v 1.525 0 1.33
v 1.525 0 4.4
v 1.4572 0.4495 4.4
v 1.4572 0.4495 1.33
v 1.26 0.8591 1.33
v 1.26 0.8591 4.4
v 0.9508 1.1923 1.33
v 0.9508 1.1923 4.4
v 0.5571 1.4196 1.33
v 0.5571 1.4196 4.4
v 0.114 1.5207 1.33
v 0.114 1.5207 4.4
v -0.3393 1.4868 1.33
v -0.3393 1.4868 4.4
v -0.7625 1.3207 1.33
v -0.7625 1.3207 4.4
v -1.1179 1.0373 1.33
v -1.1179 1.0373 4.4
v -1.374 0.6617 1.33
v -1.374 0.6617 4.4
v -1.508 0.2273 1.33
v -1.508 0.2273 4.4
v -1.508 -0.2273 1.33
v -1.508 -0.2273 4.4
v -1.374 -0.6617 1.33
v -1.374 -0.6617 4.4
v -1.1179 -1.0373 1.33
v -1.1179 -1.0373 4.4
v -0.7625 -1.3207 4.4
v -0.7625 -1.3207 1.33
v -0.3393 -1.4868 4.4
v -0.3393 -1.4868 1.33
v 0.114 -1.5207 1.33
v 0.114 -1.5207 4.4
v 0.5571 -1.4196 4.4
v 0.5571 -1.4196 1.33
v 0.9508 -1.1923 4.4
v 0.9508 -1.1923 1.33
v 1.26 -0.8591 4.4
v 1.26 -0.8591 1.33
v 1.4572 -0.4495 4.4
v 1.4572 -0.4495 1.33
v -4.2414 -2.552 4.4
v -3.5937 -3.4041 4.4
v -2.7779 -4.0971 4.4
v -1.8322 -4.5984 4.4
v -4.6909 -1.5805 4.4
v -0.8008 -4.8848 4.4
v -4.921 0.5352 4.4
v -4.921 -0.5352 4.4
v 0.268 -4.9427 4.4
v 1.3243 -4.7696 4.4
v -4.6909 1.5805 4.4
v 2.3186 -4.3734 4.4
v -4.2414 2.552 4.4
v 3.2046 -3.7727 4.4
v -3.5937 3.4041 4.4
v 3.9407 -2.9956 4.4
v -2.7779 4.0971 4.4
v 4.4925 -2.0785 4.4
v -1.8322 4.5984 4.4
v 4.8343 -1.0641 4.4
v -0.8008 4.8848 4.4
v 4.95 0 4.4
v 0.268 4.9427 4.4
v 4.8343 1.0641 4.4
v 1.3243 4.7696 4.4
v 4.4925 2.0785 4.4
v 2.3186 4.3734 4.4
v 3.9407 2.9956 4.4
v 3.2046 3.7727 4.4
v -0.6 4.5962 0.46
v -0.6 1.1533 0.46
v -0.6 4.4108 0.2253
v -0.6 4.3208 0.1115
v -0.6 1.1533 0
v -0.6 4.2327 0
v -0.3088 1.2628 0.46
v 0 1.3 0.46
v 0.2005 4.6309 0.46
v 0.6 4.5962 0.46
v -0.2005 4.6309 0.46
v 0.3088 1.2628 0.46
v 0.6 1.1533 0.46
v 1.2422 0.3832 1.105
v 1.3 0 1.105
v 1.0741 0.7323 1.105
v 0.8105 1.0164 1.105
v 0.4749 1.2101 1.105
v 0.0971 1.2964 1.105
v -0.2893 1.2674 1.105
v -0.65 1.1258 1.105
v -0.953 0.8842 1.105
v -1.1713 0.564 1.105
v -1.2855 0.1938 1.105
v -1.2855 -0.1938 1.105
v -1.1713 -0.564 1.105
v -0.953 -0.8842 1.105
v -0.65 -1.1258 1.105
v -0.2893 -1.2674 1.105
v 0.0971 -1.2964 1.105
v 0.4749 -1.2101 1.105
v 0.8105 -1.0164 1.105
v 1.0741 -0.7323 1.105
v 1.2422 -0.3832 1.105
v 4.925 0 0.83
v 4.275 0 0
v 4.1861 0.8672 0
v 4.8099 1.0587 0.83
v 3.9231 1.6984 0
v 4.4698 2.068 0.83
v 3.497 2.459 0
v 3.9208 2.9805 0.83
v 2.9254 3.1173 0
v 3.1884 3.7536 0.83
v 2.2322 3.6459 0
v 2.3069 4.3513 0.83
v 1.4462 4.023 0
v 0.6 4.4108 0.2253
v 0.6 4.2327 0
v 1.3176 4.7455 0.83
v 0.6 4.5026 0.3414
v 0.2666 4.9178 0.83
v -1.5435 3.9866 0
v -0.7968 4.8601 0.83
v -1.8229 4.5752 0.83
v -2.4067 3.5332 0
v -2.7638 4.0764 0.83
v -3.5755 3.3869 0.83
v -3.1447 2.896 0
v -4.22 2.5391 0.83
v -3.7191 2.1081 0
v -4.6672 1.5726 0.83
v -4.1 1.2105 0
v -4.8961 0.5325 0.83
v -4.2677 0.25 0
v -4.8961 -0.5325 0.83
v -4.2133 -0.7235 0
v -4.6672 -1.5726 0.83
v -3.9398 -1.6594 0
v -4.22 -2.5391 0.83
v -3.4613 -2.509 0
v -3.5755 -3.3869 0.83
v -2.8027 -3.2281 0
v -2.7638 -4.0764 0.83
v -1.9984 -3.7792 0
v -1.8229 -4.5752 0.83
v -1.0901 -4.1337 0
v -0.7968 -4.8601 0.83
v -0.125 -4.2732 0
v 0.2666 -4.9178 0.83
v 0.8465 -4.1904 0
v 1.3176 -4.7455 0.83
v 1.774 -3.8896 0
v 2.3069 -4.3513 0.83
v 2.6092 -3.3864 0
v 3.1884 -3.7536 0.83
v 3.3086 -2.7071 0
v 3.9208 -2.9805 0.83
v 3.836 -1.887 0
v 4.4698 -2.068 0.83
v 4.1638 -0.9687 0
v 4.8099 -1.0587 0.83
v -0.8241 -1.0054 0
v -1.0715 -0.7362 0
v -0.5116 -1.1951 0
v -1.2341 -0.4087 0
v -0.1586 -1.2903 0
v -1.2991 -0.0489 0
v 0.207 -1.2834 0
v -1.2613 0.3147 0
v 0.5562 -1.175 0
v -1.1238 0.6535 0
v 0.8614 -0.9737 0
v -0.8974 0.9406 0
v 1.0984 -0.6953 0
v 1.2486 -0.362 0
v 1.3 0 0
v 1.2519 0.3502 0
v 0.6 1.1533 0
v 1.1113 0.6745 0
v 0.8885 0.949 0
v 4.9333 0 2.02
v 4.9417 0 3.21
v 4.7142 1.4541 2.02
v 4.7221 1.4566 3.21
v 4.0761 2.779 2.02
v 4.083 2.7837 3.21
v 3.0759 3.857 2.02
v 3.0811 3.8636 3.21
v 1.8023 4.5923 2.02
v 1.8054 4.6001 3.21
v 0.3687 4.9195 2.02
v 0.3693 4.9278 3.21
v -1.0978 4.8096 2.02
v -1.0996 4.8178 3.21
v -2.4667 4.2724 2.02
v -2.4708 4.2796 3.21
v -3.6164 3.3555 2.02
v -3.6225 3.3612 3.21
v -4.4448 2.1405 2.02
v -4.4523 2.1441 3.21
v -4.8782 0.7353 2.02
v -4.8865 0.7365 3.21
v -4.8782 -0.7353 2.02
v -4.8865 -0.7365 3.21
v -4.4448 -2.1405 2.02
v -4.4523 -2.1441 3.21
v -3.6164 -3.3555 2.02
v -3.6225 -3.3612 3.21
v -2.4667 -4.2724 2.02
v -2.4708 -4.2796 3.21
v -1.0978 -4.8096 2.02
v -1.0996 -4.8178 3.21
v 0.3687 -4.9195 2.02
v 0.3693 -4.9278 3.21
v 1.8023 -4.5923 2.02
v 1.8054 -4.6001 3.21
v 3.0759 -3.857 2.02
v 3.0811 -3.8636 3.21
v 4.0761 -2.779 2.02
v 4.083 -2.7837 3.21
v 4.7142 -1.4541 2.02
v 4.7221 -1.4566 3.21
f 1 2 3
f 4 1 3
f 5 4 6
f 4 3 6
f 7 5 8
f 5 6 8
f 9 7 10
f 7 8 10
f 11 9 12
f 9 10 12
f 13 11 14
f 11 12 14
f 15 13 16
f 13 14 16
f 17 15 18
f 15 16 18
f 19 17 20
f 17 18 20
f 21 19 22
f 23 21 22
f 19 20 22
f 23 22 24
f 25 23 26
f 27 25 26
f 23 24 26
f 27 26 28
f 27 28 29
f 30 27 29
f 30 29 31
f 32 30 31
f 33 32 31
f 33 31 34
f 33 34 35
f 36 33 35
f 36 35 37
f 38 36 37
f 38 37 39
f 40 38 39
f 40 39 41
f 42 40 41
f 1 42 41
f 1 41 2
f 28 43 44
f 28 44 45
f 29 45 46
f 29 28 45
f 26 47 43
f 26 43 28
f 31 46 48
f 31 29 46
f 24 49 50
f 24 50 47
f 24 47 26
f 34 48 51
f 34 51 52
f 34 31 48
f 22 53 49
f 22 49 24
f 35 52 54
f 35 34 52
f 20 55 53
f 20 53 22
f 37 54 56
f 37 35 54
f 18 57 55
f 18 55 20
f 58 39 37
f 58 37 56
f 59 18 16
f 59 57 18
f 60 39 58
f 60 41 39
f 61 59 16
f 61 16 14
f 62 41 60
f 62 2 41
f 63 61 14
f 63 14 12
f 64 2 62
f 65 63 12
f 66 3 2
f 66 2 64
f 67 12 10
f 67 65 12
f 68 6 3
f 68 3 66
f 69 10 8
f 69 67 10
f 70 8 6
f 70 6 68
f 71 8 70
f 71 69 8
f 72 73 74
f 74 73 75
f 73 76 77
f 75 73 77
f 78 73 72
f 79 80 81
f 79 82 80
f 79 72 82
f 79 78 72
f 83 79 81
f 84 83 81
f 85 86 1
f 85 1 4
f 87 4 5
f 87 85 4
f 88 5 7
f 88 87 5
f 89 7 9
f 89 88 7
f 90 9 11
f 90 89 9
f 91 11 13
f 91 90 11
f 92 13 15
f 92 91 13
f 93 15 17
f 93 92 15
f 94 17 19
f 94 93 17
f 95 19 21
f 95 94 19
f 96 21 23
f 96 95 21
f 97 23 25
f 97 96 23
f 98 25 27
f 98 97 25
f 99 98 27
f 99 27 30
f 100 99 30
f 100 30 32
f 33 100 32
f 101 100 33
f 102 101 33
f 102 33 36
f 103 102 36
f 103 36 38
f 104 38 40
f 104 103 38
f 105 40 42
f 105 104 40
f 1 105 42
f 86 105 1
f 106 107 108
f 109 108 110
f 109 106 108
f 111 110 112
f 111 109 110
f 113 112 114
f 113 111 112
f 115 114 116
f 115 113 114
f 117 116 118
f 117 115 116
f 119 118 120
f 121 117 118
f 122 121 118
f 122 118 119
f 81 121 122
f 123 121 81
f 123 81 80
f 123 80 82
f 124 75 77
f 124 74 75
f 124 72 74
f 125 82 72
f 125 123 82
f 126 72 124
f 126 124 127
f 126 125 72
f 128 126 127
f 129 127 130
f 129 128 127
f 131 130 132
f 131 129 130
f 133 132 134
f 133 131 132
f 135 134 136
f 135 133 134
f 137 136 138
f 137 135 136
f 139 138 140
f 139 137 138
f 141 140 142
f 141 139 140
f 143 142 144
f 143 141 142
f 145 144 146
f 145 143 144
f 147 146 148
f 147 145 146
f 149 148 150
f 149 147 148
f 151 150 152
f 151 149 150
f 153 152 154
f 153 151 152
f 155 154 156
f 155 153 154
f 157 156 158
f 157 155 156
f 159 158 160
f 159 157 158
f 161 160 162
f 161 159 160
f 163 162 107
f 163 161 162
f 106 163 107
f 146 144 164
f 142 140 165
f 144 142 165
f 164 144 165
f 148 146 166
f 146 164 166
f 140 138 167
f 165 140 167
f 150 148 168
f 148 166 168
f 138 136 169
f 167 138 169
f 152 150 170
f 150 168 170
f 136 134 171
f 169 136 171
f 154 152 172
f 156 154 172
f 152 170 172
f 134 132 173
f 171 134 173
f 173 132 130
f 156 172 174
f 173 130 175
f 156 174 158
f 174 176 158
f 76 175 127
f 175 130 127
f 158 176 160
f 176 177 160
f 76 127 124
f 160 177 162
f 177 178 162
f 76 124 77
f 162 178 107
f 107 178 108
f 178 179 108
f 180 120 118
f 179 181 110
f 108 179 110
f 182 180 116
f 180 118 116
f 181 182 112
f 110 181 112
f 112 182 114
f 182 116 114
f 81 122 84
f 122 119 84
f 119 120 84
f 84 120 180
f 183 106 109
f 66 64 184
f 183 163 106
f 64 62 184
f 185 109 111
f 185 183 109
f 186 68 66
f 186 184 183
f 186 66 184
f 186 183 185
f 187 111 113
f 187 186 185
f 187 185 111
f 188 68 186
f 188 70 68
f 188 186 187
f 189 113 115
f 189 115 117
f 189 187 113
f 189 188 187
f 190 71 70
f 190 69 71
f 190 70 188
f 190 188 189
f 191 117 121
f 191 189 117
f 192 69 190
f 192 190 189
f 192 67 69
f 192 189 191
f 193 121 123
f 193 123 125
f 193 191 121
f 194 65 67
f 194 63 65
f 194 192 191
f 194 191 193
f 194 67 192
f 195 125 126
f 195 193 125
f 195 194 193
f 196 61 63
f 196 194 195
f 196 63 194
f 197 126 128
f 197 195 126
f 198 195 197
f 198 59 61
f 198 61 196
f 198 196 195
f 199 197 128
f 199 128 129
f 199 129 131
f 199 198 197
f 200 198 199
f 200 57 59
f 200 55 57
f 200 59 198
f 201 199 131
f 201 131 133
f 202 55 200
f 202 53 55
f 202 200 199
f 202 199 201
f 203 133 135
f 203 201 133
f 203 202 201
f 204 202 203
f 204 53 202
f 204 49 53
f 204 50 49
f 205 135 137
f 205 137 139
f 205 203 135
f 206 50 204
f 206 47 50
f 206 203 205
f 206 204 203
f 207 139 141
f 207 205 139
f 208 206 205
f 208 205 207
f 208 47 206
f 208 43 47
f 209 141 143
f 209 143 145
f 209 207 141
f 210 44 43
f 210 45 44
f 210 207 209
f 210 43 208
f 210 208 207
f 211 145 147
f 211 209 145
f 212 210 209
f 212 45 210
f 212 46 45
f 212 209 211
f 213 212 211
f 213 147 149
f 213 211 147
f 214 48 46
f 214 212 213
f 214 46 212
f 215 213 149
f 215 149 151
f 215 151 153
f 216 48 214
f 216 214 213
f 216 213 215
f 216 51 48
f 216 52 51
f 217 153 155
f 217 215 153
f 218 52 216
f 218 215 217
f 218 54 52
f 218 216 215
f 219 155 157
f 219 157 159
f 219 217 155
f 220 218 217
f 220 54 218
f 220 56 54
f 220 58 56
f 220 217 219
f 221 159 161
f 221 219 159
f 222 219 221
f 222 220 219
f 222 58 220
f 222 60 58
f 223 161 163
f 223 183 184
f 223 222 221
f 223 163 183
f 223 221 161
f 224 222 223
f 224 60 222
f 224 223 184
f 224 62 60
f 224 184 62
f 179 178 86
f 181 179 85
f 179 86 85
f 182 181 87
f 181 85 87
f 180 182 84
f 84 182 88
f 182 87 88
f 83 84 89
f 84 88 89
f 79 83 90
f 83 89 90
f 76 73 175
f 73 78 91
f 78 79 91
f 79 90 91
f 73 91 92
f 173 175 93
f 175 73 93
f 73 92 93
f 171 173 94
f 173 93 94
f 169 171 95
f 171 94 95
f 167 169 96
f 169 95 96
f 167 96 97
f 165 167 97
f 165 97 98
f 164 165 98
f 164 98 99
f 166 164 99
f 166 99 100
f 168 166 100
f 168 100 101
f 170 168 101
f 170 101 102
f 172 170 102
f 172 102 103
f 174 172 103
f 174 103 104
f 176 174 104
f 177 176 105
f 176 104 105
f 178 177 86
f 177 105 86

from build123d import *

# Parameters (mm, degrees)
F0_R         = 4.275
F2_R         = 4.925
F4_R         = 4.95
F8_R         = 1.525
F9_DEPTH     = 3.57
F10_R        = 1.3
F11_DEPTH    = 0.83
F13_DEPTH    = 0.46
F14_S5_R     = 1.3
F14_T6_DEPTH = 4


# Not quite as in the source:
# - a fillet or chamfer that OpenCascade refuses, or shapes differently, is made with other operations: its cross-section is extruded or revolved along the edge and cut away or added


with BuildPart() as f6:
    # F0 (on Top) → F6 section 0
    with BuildSketch(Plane.XY):
        Circle(F0_R)
    # F2 (on offset) → F6 section 1
    with BuildSketch(Plane.XY.offset(0.83)):
        Circle(F2_R)
    loft()

    # F2 (on offset) → F7 section 0
    with BuildSketch(Plane.XY.offset(0.83)):
        Circle(F2_R)
    # F4 (on offset) → F7 section 1
    with BuildSketch(Plane.XY.offset(4.4)):
        Circle(F4_R)
    loft()

    # F8 (on face) → F9 (cut, through all)
    with BuildSketch(Plane.XY.offset(4.4)):
        Circle(F8_R)
    extrude(amount=-F9_DEPTH, mode=Mode.SUBTRACT)

    # F10 (on face) → F11 (cut, through all)
    with BuildSketch(Plane(origin=(0, 0, 0), x_dir=(1, 0, 0), z_dir=(0, 0, -1))):
        Circle(F10_R)
    extrude(amount=-F11_DEPTH, mode=Mode.SUBTRACT)

    # F12 (on face) → F13 (cut)
    with BuildSketch(Plane(origin=(0, 0, 0), x_dir=(1, 0, 0), z_dir=(0, 0, -1))):
        Polygon((-0.6, -5), (0, -5), (0.6, -5), (0.6, 0), (0, 0), (-0.6, 0), align=None)
    extrude(amount=-F13_DEPTH, mode=Mode.SUBTRACT)

    # F14: chamfer of 0.5 on 1 edges, made by hand


with BuildPart() as f14_tool2:
    # F14_s3 → F14_t4 (revolve)
    with BuildSketch(Plane.XZ):
        Polygon((1.525, 1.33), (1.025, 0.83), (1.525, 0.83), align=None)
    revolve(axis=Axis((0, 0, 0.83), (0, 0, 1)))

    # F14_s5 → F14_t6 (cut, symmetric)
    with BuildSketch(Plane.XY.offset(1.1)):
        Circle(F14_S5_R)
    extrude(amount=F14_T6_DEPTH, both=True, mode=Mode.SUBTRACT)


with BuildPart() as f6_1:
    add(f6.part)

    # F14_t1: union F14_tool2
    add(f14_tool2.part)


solid = f6_1.part
